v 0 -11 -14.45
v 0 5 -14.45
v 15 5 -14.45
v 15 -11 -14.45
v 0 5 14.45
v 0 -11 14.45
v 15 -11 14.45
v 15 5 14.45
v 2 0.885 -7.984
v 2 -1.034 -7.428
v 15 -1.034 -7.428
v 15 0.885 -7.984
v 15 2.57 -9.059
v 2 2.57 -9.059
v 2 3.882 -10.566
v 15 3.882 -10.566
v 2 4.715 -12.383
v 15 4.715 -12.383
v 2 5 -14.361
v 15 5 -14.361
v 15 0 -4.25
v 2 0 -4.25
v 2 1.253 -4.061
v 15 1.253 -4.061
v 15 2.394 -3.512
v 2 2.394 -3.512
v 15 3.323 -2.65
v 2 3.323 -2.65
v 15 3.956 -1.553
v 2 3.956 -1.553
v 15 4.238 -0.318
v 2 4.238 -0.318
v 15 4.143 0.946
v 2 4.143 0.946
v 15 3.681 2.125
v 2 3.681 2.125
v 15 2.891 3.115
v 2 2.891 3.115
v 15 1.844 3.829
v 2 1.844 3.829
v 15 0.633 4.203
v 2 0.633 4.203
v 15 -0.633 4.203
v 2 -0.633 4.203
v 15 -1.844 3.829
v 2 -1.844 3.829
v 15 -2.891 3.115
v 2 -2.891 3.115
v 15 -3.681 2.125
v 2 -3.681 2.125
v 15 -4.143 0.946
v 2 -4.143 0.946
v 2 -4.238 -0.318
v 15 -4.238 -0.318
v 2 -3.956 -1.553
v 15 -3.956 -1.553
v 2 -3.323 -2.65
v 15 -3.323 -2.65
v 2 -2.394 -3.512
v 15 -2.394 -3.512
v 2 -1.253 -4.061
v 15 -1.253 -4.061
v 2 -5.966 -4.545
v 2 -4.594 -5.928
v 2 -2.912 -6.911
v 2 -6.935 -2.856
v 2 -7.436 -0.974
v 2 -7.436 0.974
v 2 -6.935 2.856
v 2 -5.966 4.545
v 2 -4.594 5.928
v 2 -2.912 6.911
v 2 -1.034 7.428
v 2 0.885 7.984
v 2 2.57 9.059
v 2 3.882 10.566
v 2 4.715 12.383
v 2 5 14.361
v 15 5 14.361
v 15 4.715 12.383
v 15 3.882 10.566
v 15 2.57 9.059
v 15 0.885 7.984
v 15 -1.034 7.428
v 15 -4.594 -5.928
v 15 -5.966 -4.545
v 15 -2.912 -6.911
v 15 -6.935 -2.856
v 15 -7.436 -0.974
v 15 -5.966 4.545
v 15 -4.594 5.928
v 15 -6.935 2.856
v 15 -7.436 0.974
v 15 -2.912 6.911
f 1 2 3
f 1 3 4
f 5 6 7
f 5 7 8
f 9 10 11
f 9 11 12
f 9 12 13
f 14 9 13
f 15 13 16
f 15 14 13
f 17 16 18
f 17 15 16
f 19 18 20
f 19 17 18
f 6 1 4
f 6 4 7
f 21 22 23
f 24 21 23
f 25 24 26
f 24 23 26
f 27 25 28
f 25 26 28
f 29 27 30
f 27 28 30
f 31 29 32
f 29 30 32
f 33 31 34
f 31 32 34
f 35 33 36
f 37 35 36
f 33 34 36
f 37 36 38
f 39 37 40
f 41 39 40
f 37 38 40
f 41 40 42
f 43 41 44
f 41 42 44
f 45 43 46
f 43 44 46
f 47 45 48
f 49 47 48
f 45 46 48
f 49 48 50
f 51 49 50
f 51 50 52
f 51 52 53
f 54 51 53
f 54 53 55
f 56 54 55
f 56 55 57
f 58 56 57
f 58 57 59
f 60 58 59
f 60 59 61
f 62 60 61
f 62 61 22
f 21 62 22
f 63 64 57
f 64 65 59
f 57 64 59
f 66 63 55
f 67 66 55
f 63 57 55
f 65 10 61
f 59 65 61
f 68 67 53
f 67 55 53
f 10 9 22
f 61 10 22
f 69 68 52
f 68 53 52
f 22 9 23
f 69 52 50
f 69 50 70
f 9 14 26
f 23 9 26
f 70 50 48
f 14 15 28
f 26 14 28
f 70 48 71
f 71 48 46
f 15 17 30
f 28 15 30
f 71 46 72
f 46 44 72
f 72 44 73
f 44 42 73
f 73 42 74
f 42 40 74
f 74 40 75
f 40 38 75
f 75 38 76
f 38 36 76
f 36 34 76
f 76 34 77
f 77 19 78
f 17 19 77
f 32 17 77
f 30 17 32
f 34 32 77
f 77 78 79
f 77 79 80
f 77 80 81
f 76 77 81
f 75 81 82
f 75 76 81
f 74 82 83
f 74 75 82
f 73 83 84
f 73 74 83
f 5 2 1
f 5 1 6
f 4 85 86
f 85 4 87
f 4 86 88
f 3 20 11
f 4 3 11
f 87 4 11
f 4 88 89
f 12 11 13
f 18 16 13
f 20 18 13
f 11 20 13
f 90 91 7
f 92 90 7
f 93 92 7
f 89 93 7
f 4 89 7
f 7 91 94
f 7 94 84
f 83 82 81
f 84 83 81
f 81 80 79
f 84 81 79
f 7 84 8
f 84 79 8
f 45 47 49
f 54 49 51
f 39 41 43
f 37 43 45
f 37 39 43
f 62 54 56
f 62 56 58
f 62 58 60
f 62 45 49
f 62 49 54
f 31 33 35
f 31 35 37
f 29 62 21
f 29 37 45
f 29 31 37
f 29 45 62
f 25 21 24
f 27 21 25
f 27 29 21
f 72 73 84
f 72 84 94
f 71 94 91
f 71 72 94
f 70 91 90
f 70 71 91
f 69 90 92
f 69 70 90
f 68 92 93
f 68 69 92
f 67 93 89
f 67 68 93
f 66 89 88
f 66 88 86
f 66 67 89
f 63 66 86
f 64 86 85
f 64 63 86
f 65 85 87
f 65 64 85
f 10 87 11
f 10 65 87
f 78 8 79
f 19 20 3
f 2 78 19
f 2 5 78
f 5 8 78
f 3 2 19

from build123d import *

# Parameters (mm, degrees)
CROQUIS2_R                = 4.25
SALIENTE_EXTRUIR1_DEPTH   = 15
SALIENTE_EXTRUIR1_2_DEPTH = 15
CROQUIS3_W                = 28.9
CROQUIS3_H                = 16
SALIENTE_EXTRUIR2_DEPTH   = 2


with BuildPart() as part:
    # Croquis2 → Saliente-Extruir1 (new body)
    with BuildSketch(Plane(origin=(0, 0, 0), x_dir=(0, 0, -1), z_dir=(1, 0, 0))):
        Circle(CROQUIS2_R)
    extrude(amount=SALIENTE_EXTRUIR1_DEPTH)



with BuildPart() as body_2:
    # Croquis2 → Saliente-Extruir1 2 (new body)
    with BuildSketch(Plane(origin=(0, 0, 0), x_dir=(0, 0, -1), z_dir=(1, 0, 0))):
        with BuildLine():
            Line((-14.45, 5), (-14.361406616, 5))
            ThreePointArc((-14.361406616, 5), (-9.765681466, 3.280086206), (-7.428313767, -1.034482759))
            ThreePointArc((-7.428313767, -1.034482759), (0, -7.5), (7.428313767, -1.034482759))
            ThreePointArc((7.428313767, -1.034482759), (9.765681466, 3.280086206), (14.361406616, 5))
            Line((14.361406616, 5), (14.45, 5))
            Line((14.45, 5), (14.45, -11))
            Line((14.45, -11), (-14.45, -11))
            Line((-14.45, -11), (-14.45, 5))
        make_face()
    extrude(amount=SALIENTE_EXTRUIR1_2_DEPTH)


with BuildPart() as part_1:
    add(part.part)

    add(body_2.part)  # Saliente-Extruir2 merges body 2
    # Croquis3 → Saliente-Extruir2 (add)
    with BuildSketch(Plane.ZY):
        with Locations((0, -3)):
            Rectangle(CROQUIS3_W, CROQUIS3_H)
    extrude(amount=-SALIENTE_EXTRUIR2_DEPTH)


solid = part_1.part
